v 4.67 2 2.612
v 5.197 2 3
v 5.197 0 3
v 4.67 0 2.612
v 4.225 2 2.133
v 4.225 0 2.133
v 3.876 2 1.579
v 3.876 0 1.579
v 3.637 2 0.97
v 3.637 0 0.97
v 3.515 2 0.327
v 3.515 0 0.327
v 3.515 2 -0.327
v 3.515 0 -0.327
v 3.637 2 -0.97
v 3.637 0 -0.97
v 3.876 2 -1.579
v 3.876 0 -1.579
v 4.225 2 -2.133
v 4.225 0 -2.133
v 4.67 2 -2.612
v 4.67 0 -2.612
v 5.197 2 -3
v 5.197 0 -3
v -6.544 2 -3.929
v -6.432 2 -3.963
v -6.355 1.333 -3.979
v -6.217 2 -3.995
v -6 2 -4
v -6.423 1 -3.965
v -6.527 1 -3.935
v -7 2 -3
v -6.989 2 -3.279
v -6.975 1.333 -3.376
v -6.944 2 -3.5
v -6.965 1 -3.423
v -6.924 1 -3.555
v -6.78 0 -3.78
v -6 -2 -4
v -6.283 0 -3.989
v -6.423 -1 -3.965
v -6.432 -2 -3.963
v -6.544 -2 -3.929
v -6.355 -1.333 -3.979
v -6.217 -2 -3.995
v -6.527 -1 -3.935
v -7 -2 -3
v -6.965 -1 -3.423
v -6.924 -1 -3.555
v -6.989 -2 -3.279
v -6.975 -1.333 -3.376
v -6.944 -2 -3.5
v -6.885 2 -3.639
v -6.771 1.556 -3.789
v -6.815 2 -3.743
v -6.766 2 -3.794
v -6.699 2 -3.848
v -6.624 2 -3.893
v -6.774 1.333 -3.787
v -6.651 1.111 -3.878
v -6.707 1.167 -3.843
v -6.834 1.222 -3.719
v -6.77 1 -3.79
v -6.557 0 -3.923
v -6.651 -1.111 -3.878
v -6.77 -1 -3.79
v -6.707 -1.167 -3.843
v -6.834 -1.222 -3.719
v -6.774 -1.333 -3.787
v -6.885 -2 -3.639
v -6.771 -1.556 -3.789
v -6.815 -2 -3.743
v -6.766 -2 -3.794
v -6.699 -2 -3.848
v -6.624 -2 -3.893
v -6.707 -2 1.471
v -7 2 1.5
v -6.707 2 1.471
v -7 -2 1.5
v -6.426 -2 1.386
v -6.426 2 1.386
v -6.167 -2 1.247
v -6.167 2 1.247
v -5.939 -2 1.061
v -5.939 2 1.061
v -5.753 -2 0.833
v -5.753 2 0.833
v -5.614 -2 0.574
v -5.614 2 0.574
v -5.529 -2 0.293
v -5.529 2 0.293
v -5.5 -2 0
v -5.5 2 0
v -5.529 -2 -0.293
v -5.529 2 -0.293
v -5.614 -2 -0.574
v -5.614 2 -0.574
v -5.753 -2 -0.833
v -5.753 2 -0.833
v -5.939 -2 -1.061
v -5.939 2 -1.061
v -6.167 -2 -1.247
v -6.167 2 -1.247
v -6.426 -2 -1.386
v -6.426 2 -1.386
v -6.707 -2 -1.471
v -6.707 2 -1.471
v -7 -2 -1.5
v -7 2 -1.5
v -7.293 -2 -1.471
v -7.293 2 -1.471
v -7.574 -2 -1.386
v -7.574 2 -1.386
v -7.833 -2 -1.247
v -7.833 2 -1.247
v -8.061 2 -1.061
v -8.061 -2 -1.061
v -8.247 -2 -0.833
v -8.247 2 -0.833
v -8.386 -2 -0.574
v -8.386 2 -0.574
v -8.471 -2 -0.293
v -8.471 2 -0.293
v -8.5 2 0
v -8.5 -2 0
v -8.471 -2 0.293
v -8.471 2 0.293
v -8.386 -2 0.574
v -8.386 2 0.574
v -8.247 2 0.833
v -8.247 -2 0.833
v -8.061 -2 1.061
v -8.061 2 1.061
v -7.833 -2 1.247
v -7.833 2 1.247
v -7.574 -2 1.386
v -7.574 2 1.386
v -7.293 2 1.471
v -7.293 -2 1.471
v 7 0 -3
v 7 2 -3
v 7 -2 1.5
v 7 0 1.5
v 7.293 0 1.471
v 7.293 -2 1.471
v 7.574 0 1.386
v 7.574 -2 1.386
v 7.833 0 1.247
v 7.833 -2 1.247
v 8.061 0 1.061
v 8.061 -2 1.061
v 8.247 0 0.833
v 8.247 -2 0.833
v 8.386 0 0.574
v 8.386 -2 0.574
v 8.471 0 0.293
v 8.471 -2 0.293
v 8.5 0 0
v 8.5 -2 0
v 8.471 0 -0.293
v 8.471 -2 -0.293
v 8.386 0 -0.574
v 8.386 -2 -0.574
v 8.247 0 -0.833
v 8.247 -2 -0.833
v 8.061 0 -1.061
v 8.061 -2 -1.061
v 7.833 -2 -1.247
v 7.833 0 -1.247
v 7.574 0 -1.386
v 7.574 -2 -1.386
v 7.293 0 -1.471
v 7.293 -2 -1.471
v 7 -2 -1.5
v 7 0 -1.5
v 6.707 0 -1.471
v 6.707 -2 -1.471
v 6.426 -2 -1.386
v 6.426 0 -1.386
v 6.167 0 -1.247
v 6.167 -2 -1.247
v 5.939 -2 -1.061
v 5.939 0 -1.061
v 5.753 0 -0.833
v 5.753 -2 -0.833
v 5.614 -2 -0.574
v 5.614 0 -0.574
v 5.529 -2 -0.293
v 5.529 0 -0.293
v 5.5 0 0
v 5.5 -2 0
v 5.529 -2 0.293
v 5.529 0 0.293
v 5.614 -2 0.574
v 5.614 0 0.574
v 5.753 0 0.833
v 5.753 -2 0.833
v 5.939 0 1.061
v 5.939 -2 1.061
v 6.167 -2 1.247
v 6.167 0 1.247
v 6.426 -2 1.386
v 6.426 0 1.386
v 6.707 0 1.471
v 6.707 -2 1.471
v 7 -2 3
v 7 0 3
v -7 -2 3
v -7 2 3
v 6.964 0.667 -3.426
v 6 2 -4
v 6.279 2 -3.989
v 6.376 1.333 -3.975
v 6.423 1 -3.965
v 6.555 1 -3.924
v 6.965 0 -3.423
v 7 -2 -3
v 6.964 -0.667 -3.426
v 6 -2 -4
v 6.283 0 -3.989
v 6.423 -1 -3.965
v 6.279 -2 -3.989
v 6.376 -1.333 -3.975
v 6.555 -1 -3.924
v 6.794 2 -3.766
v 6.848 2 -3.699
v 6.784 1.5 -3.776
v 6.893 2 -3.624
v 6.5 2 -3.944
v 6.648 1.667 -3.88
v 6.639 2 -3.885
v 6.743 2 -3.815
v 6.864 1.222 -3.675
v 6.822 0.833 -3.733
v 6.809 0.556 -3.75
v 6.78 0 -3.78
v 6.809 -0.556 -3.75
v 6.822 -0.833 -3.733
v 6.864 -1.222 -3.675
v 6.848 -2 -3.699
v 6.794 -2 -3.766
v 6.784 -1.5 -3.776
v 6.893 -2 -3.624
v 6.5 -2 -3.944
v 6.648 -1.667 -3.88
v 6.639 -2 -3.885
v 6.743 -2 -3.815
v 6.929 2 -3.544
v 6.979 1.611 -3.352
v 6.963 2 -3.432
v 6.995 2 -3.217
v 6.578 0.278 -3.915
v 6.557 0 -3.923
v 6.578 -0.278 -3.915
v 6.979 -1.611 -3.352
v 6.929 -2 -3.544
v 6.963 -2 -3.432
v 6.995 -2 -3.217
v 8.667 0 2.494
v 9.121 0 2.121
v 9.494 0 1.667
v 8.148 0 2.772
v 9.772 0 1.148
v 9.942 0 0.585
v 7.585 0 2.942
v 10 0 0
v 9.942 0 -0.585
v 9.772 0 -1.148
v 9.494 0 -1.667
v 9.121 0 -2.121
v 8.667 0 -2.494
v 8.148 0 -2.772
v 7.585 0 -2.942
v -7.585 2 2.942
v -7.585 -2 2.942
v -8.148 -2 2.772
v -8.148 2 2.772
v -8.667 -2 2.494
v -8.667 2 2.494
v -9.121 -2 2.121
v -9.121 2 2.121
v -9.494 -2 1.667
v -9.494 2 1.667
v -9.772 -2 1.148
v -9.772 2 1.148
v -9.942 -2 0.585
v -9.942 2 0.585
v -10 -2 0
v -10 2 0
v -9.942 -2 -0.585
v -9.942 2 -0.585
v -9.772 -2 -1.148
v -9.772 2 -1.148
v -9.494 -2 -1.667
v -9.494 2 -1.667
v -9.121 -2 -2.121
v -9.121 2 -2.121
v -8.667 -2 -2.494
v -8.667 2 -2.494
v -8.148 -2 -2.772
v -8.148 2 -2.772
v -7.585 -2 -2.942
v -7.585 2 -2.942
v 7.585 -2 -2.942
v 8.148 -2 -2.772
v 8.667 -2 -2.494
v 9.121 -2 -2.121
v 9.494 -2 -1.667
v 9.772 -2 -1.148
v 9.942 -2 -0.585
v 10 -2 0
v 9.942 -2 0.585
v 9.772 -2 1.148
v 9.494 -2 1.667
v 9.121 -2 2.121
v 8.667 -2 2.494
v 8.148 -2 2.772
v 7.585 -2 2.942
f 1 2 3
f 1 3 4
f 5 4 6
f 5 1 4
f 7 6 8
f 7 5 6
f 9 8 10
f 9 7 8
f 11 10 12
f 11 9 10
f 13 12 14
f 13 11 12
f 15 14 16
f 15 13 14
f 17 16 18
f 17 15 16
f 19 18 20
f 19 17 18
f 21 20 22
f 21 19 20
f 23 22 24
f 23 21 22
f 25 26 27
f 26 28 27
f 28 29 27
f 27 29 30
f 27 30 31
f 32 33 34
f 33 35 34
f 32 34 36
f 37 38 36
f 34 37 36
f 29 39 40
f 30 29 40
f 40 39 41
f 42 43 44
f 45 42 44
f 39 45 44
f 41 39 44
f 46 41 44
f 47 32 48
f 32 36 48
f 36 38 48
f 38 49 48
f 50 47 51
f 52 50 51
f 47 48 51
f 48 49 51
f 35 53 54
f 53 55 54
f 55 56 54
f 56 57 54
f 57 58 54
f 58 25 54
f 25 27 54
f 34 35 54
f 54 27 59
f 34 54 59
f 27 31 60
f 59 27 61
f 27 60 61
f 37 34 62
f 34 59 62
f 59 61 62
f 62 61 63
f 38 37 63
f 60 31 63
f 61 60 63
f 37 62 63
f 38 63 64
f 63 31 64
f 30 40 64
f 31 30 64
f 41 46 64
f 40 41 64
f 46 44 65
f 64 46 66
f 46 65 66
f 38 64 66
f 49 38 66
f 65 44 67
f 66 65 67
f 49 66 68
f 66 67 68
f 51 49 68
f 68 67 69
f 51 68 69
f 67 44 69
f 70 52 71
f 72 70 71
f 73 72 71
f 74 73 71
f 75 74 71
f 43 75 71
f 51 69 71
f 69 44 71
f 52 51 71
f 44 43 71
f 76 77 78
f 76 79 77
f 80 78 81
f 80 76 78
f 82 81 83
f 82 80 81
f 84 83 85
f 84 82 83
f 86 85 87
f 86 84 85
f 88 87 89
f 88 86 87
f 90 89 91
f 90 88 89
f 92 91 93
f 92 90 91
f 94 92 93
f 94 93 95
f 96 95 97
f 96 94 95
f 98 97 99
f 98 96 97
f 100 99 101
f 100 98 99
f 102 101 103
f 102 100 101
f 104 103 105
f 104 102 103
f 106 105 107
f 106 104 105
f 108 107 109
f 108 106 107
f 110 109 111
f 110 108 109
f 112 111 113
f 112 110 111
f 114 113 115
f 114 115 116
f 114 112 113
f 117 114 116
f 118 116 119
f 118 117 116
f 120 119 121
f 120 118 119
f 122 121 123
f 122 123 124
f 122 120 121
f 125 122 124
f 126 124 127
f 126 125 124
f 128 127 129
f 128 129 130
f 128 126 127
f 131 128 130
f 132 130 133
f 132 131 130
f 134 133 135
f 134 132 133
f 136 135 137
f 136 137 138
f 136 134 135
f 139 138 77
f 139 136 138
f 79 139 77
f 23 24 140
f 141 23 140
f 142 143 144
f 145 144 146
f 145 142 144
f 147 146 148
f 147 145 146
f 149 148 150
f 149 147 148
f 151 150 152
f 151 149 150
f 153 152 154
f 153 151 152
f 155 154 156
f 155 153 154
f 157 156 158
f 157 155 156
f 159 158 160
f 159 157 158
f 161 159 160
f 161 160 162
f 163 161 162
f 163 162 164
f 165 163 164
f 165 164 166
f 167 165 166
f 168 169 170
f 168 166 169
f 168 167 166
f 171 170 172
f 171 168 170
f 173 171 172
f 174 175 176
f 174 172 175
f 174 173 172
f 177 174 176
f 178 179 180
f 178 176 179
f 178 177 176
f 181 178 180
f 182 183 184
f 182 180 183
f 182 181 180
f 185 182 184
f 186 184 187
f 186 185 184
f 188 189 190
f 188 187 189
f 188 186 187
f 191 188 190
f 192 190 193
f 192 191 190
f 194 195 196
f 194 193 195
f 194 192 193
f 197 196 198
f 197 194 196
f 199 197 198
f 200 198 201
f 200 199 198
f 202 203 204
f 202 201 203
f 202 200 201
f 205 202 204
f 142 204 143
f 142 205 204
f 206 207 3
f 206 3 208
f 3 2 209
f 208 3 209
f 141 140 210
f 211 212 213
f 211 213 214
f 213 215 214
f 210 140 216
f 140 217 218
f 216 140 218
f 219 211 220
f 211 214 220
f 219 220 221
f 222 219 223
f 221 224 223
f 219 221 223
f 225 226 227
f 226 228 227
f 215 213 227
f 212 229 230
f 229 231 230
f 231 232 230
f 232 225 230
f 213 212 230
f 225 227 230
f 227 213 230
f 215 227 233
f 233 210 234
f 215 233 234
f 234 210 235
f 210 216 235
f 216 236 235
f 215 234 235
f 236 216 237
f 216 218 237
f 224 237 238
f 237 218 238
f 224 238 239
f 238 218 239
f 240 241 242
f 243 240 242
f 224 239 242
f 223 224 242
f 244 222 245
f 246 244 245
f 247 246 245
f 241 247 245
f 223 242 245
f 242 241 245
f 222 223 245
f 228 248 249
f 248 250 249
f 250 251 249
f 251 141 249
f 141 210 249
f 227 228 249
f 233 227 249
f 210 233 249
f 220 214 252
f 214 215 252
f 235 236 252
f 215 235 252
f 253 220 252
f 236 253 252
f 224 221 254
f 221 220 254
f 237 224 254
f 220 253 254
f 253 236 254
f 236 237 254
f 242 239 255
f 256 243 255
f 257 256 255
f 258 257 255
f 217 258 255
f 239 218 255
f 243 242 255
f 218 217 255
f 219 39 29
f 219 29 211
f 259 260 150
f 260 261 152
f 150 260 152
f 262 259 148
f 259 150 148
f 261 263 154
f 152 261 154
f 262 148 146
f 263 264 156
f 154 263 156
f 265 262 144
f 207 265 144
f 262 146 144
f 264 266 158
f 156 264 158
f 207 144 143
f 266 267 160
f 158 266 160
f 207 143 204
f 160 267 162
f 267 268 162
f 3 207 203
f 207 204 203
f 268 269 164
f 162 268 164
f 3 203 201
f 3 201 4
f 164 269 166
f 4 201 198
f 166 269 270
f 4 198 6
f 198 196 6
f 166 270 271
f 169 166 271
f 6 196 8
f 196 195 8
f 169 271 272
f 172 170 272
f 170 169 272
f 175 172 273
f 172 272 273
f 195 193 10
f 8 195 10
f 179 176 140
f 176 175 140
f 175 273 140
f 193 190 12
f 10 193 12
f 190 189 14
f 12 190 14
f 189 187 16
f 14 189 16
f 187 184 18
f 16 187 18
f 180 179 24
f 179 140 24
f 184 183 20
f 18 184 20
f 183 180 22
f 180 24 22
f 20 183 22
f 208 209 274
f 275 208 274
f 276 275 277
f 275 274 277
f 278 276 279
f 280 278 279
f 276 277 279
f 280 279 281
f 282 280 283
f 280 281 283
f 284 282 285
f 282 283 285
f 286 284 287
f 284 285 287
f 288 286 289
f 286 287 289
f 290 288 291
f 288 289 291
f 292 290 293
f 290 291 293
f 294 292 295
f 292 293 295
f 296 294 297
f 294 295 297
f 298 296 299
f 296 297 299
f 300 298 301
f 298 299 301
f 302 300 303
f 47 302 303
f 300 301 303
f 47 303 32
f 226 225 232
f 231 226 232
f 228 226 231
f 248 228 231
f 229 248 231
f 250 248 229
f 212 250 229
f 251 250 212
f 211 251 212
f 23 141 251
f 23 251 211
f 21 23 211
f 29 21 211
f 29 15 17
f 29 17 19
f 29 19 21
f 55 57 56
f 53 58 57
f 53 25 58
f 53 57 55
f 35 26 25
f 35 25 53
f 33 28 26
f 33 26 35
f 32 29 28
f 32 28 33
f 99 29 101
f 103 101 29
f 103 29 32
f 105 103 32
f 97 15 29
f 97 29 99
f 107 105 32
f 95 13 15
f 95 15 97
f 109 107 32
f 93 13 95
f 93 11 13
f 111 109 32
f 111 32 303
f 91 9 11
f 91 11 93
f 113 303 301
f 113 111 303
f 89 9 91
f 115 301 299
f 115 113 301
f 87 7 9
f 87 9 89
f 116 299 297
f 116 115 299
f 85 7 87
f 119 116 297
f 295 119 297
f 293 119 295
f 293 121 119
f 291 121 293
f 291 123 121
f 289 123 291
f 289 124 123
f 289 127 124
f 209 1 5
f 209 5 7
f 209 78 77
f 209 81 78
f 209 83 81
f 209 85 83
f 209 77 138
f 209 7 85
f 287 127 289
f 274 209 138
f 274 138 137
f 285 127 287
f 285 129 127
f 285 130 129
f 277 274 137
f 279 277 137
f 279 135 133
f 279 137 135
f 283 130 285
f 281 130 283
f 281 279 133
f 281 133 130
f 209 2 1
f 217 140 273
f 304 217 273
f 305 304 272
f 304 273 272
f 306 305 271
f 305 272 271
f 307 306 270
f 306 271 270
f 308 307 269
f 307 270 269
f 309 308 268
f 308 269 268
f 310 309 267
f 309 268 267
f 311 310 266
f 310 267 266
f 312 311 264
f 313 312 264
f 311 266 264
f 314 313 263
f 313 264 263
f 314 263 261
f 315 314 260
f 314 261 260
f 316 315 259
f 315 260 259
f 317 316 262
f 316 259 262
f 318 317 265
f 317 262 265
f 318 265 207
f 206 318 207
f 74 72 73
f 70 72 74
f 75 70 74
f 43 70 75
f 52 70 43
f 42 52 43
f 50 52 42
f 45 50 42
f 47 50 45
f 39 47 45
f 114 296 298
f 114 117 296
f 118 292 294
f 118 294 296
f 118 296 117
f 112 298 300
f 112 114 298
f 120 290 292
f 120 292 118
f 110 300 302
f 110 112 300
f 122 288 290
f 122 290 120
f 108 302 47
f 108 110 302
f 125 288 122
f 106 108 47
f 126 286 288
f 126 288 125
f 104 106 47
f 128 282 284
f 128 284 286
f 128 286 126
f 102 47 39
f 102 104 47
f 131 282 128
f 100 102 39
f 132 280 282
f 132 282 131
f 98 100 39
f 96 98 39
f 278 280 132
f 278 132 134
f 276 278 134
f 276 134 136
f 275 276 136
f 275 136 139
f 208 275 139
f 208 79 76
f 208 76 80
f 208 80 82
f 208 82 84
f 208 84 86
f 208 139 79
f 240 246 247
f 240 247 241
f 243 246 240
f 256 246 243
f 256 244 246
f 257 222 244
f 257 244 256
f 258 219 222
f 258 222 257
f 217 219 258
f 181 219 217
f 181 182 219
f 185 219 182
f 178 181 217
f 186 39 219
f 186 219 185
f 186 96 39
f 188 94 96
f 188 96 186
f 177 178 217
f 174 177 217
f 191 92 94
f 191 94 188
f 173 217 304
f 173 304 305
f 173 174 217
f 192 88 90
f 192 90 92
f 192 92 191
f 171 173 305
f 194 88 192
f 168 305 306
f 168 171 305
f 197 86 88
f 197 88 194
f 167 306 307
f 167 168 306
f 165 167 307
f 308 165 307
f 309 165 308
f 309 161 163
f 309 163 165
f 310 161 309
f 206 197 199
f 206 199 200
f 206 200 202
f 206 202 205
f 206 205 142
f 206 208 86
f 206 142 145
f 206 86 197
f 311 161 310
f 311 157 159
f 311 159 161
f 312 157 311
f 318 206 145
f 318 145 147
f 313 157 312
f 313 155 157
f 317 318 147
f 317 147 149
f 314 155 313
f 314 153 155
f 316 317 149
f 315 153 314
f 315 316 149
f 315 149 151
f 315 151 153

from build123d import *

# Parameters (mm, degrees)
SKETCH1_R           = 1.5
BOSS_EXTRUDE1_DEPTH = 2
CUT_EXTRUDE1_DEPTH  = 2
BOSS_EXTRUDE2_REACH = 13.18
SKETCH3_W           = 14
SKETCH3_H           = 1
FILLET1_SIZE        = 1


with BuildPart() as part:
    # Sketch1 → Boss-Extrude1 (new, symmetric)
    with BuildSketch(Plane(origin=(0, 0, 0), x_dir=(1, 0, 0), z_dir=(0, 1, 0))):
        with BuildLine():
            Line((-7, 3), (7, 3))
            ThreePointArc((7, 3), (10, 0), (7, -3))
            Line((7, -3), (-7, -3))
            ThreePointArc((-7, -3), (-10, 0), (-7, 3))
        make_face()
        with Locations(Location((-7, 0, 0), (0, 0, 270))):
            Circle(SKETCH1_R, mode=Mode.SUBTRACT)
        with Locations(Location((7, 0, 0), (0, 0, 270))):
            Circle(SKETCH1_R, mode=Mode.SUBTRACT)
    extrude(amount=BOSS_EXTRUDE1_DEPTH, both=True)

    # Sketch2 → Cut-Extrude1 (cut)
    with BuildSketch(Plane(origin=(0, 2, 0), x_dir=(1, 0, 0), z_dir=(0, 1, 0))):
        with BuildLine():
            Line((5.197224362, 3), (7, 3))
            ThreePointArc((7, 3), (10, 0), (7, -3))
            Line((7, -3), (5.197224362, -3))
            ThreePointArc((5.197224362, -3), (3.5, 0), (5.197224362, 3))
        make_face()
    extrude(amount=-CUT_EXTRUDE1_DEPTH, mode=Mode.SUBTRACT)

    # Boss-Extrude2: up to this face of the body (flat: up to its plane)
    boss_extrude2_end = Plane(part.part.faces().sort_by_distance((-2.270949872, 2, 0))[0])
    # Sketch3 → Boss-Extrude2 (add, up to the picked face)
    with BuildSketch(Plane.XZ.offset(2), mode=Mode.PRIVATE) as boss_extrude2_sk1:
        with Locations((0, -3.5)):
            Rectangle(SKETCH3_W, SKETCH3_H)
    boss_extrude2_tool1 = split(extrude(boss_extrude2_sk1.sketch, amount=-BOSS_EXTRUDE2_REACH, mode=Mode.PRIVATE), bisect_by=boss_extrude2_end, keep=Keep.BOTH, mode=Mode.PRIVATE)
    add(boss_extrude2_tool1.solids().sort_by(Axis((0, -2, -3.5), (0, 1, 0)))[0])

    # Fillet1
    # a fillet whose section is not a circle: 1 mm, written as the material it takes off along each edge
    with BuildSketch(Plane(origin=(7, -4.5, -4), x_dir=(0, 0, 1), z_dir=(0, 1, 0)), Plane(origin=(-7, -4.5, -4), x_dir=(1, 0, 0), z_dir=(0, 1, 0))) as fillet1_piece_1:
        with BuildLine():
            add(Edge.make_bspline([(FILLET1_SIZE, 0), (FILLET1_SIZE * 0.831801948466, 0), (FILLET1_SIZE * 0.663603896932, 0), (FILLET1_SIZE * 0.292893218813, -FILLET1_SIZE * 0.0716919198361), (FILLET1_SIZE * 0.0716919198361, -FILLET1_SIZE * 0.292893218813), (0, -FILLET1_SIZE * 0.663603896932), (0, -FILLET1_SIZE * 0.831801948466), (0, -FILLET1_SIZE)], knots=[0, 0, 0, 0, 0, 0, 0.5, 0.5, 1, 1, 1, 1, 1, 1], degree=5))
            Line((0, -FILLET1_SIZE), (0, 0))
            Line((0, 0), (FILLET1_SIZE, 0))
        make_face()
    extrude(amount=9, mode=Mode.SUBTRACT)


solid = part.part
